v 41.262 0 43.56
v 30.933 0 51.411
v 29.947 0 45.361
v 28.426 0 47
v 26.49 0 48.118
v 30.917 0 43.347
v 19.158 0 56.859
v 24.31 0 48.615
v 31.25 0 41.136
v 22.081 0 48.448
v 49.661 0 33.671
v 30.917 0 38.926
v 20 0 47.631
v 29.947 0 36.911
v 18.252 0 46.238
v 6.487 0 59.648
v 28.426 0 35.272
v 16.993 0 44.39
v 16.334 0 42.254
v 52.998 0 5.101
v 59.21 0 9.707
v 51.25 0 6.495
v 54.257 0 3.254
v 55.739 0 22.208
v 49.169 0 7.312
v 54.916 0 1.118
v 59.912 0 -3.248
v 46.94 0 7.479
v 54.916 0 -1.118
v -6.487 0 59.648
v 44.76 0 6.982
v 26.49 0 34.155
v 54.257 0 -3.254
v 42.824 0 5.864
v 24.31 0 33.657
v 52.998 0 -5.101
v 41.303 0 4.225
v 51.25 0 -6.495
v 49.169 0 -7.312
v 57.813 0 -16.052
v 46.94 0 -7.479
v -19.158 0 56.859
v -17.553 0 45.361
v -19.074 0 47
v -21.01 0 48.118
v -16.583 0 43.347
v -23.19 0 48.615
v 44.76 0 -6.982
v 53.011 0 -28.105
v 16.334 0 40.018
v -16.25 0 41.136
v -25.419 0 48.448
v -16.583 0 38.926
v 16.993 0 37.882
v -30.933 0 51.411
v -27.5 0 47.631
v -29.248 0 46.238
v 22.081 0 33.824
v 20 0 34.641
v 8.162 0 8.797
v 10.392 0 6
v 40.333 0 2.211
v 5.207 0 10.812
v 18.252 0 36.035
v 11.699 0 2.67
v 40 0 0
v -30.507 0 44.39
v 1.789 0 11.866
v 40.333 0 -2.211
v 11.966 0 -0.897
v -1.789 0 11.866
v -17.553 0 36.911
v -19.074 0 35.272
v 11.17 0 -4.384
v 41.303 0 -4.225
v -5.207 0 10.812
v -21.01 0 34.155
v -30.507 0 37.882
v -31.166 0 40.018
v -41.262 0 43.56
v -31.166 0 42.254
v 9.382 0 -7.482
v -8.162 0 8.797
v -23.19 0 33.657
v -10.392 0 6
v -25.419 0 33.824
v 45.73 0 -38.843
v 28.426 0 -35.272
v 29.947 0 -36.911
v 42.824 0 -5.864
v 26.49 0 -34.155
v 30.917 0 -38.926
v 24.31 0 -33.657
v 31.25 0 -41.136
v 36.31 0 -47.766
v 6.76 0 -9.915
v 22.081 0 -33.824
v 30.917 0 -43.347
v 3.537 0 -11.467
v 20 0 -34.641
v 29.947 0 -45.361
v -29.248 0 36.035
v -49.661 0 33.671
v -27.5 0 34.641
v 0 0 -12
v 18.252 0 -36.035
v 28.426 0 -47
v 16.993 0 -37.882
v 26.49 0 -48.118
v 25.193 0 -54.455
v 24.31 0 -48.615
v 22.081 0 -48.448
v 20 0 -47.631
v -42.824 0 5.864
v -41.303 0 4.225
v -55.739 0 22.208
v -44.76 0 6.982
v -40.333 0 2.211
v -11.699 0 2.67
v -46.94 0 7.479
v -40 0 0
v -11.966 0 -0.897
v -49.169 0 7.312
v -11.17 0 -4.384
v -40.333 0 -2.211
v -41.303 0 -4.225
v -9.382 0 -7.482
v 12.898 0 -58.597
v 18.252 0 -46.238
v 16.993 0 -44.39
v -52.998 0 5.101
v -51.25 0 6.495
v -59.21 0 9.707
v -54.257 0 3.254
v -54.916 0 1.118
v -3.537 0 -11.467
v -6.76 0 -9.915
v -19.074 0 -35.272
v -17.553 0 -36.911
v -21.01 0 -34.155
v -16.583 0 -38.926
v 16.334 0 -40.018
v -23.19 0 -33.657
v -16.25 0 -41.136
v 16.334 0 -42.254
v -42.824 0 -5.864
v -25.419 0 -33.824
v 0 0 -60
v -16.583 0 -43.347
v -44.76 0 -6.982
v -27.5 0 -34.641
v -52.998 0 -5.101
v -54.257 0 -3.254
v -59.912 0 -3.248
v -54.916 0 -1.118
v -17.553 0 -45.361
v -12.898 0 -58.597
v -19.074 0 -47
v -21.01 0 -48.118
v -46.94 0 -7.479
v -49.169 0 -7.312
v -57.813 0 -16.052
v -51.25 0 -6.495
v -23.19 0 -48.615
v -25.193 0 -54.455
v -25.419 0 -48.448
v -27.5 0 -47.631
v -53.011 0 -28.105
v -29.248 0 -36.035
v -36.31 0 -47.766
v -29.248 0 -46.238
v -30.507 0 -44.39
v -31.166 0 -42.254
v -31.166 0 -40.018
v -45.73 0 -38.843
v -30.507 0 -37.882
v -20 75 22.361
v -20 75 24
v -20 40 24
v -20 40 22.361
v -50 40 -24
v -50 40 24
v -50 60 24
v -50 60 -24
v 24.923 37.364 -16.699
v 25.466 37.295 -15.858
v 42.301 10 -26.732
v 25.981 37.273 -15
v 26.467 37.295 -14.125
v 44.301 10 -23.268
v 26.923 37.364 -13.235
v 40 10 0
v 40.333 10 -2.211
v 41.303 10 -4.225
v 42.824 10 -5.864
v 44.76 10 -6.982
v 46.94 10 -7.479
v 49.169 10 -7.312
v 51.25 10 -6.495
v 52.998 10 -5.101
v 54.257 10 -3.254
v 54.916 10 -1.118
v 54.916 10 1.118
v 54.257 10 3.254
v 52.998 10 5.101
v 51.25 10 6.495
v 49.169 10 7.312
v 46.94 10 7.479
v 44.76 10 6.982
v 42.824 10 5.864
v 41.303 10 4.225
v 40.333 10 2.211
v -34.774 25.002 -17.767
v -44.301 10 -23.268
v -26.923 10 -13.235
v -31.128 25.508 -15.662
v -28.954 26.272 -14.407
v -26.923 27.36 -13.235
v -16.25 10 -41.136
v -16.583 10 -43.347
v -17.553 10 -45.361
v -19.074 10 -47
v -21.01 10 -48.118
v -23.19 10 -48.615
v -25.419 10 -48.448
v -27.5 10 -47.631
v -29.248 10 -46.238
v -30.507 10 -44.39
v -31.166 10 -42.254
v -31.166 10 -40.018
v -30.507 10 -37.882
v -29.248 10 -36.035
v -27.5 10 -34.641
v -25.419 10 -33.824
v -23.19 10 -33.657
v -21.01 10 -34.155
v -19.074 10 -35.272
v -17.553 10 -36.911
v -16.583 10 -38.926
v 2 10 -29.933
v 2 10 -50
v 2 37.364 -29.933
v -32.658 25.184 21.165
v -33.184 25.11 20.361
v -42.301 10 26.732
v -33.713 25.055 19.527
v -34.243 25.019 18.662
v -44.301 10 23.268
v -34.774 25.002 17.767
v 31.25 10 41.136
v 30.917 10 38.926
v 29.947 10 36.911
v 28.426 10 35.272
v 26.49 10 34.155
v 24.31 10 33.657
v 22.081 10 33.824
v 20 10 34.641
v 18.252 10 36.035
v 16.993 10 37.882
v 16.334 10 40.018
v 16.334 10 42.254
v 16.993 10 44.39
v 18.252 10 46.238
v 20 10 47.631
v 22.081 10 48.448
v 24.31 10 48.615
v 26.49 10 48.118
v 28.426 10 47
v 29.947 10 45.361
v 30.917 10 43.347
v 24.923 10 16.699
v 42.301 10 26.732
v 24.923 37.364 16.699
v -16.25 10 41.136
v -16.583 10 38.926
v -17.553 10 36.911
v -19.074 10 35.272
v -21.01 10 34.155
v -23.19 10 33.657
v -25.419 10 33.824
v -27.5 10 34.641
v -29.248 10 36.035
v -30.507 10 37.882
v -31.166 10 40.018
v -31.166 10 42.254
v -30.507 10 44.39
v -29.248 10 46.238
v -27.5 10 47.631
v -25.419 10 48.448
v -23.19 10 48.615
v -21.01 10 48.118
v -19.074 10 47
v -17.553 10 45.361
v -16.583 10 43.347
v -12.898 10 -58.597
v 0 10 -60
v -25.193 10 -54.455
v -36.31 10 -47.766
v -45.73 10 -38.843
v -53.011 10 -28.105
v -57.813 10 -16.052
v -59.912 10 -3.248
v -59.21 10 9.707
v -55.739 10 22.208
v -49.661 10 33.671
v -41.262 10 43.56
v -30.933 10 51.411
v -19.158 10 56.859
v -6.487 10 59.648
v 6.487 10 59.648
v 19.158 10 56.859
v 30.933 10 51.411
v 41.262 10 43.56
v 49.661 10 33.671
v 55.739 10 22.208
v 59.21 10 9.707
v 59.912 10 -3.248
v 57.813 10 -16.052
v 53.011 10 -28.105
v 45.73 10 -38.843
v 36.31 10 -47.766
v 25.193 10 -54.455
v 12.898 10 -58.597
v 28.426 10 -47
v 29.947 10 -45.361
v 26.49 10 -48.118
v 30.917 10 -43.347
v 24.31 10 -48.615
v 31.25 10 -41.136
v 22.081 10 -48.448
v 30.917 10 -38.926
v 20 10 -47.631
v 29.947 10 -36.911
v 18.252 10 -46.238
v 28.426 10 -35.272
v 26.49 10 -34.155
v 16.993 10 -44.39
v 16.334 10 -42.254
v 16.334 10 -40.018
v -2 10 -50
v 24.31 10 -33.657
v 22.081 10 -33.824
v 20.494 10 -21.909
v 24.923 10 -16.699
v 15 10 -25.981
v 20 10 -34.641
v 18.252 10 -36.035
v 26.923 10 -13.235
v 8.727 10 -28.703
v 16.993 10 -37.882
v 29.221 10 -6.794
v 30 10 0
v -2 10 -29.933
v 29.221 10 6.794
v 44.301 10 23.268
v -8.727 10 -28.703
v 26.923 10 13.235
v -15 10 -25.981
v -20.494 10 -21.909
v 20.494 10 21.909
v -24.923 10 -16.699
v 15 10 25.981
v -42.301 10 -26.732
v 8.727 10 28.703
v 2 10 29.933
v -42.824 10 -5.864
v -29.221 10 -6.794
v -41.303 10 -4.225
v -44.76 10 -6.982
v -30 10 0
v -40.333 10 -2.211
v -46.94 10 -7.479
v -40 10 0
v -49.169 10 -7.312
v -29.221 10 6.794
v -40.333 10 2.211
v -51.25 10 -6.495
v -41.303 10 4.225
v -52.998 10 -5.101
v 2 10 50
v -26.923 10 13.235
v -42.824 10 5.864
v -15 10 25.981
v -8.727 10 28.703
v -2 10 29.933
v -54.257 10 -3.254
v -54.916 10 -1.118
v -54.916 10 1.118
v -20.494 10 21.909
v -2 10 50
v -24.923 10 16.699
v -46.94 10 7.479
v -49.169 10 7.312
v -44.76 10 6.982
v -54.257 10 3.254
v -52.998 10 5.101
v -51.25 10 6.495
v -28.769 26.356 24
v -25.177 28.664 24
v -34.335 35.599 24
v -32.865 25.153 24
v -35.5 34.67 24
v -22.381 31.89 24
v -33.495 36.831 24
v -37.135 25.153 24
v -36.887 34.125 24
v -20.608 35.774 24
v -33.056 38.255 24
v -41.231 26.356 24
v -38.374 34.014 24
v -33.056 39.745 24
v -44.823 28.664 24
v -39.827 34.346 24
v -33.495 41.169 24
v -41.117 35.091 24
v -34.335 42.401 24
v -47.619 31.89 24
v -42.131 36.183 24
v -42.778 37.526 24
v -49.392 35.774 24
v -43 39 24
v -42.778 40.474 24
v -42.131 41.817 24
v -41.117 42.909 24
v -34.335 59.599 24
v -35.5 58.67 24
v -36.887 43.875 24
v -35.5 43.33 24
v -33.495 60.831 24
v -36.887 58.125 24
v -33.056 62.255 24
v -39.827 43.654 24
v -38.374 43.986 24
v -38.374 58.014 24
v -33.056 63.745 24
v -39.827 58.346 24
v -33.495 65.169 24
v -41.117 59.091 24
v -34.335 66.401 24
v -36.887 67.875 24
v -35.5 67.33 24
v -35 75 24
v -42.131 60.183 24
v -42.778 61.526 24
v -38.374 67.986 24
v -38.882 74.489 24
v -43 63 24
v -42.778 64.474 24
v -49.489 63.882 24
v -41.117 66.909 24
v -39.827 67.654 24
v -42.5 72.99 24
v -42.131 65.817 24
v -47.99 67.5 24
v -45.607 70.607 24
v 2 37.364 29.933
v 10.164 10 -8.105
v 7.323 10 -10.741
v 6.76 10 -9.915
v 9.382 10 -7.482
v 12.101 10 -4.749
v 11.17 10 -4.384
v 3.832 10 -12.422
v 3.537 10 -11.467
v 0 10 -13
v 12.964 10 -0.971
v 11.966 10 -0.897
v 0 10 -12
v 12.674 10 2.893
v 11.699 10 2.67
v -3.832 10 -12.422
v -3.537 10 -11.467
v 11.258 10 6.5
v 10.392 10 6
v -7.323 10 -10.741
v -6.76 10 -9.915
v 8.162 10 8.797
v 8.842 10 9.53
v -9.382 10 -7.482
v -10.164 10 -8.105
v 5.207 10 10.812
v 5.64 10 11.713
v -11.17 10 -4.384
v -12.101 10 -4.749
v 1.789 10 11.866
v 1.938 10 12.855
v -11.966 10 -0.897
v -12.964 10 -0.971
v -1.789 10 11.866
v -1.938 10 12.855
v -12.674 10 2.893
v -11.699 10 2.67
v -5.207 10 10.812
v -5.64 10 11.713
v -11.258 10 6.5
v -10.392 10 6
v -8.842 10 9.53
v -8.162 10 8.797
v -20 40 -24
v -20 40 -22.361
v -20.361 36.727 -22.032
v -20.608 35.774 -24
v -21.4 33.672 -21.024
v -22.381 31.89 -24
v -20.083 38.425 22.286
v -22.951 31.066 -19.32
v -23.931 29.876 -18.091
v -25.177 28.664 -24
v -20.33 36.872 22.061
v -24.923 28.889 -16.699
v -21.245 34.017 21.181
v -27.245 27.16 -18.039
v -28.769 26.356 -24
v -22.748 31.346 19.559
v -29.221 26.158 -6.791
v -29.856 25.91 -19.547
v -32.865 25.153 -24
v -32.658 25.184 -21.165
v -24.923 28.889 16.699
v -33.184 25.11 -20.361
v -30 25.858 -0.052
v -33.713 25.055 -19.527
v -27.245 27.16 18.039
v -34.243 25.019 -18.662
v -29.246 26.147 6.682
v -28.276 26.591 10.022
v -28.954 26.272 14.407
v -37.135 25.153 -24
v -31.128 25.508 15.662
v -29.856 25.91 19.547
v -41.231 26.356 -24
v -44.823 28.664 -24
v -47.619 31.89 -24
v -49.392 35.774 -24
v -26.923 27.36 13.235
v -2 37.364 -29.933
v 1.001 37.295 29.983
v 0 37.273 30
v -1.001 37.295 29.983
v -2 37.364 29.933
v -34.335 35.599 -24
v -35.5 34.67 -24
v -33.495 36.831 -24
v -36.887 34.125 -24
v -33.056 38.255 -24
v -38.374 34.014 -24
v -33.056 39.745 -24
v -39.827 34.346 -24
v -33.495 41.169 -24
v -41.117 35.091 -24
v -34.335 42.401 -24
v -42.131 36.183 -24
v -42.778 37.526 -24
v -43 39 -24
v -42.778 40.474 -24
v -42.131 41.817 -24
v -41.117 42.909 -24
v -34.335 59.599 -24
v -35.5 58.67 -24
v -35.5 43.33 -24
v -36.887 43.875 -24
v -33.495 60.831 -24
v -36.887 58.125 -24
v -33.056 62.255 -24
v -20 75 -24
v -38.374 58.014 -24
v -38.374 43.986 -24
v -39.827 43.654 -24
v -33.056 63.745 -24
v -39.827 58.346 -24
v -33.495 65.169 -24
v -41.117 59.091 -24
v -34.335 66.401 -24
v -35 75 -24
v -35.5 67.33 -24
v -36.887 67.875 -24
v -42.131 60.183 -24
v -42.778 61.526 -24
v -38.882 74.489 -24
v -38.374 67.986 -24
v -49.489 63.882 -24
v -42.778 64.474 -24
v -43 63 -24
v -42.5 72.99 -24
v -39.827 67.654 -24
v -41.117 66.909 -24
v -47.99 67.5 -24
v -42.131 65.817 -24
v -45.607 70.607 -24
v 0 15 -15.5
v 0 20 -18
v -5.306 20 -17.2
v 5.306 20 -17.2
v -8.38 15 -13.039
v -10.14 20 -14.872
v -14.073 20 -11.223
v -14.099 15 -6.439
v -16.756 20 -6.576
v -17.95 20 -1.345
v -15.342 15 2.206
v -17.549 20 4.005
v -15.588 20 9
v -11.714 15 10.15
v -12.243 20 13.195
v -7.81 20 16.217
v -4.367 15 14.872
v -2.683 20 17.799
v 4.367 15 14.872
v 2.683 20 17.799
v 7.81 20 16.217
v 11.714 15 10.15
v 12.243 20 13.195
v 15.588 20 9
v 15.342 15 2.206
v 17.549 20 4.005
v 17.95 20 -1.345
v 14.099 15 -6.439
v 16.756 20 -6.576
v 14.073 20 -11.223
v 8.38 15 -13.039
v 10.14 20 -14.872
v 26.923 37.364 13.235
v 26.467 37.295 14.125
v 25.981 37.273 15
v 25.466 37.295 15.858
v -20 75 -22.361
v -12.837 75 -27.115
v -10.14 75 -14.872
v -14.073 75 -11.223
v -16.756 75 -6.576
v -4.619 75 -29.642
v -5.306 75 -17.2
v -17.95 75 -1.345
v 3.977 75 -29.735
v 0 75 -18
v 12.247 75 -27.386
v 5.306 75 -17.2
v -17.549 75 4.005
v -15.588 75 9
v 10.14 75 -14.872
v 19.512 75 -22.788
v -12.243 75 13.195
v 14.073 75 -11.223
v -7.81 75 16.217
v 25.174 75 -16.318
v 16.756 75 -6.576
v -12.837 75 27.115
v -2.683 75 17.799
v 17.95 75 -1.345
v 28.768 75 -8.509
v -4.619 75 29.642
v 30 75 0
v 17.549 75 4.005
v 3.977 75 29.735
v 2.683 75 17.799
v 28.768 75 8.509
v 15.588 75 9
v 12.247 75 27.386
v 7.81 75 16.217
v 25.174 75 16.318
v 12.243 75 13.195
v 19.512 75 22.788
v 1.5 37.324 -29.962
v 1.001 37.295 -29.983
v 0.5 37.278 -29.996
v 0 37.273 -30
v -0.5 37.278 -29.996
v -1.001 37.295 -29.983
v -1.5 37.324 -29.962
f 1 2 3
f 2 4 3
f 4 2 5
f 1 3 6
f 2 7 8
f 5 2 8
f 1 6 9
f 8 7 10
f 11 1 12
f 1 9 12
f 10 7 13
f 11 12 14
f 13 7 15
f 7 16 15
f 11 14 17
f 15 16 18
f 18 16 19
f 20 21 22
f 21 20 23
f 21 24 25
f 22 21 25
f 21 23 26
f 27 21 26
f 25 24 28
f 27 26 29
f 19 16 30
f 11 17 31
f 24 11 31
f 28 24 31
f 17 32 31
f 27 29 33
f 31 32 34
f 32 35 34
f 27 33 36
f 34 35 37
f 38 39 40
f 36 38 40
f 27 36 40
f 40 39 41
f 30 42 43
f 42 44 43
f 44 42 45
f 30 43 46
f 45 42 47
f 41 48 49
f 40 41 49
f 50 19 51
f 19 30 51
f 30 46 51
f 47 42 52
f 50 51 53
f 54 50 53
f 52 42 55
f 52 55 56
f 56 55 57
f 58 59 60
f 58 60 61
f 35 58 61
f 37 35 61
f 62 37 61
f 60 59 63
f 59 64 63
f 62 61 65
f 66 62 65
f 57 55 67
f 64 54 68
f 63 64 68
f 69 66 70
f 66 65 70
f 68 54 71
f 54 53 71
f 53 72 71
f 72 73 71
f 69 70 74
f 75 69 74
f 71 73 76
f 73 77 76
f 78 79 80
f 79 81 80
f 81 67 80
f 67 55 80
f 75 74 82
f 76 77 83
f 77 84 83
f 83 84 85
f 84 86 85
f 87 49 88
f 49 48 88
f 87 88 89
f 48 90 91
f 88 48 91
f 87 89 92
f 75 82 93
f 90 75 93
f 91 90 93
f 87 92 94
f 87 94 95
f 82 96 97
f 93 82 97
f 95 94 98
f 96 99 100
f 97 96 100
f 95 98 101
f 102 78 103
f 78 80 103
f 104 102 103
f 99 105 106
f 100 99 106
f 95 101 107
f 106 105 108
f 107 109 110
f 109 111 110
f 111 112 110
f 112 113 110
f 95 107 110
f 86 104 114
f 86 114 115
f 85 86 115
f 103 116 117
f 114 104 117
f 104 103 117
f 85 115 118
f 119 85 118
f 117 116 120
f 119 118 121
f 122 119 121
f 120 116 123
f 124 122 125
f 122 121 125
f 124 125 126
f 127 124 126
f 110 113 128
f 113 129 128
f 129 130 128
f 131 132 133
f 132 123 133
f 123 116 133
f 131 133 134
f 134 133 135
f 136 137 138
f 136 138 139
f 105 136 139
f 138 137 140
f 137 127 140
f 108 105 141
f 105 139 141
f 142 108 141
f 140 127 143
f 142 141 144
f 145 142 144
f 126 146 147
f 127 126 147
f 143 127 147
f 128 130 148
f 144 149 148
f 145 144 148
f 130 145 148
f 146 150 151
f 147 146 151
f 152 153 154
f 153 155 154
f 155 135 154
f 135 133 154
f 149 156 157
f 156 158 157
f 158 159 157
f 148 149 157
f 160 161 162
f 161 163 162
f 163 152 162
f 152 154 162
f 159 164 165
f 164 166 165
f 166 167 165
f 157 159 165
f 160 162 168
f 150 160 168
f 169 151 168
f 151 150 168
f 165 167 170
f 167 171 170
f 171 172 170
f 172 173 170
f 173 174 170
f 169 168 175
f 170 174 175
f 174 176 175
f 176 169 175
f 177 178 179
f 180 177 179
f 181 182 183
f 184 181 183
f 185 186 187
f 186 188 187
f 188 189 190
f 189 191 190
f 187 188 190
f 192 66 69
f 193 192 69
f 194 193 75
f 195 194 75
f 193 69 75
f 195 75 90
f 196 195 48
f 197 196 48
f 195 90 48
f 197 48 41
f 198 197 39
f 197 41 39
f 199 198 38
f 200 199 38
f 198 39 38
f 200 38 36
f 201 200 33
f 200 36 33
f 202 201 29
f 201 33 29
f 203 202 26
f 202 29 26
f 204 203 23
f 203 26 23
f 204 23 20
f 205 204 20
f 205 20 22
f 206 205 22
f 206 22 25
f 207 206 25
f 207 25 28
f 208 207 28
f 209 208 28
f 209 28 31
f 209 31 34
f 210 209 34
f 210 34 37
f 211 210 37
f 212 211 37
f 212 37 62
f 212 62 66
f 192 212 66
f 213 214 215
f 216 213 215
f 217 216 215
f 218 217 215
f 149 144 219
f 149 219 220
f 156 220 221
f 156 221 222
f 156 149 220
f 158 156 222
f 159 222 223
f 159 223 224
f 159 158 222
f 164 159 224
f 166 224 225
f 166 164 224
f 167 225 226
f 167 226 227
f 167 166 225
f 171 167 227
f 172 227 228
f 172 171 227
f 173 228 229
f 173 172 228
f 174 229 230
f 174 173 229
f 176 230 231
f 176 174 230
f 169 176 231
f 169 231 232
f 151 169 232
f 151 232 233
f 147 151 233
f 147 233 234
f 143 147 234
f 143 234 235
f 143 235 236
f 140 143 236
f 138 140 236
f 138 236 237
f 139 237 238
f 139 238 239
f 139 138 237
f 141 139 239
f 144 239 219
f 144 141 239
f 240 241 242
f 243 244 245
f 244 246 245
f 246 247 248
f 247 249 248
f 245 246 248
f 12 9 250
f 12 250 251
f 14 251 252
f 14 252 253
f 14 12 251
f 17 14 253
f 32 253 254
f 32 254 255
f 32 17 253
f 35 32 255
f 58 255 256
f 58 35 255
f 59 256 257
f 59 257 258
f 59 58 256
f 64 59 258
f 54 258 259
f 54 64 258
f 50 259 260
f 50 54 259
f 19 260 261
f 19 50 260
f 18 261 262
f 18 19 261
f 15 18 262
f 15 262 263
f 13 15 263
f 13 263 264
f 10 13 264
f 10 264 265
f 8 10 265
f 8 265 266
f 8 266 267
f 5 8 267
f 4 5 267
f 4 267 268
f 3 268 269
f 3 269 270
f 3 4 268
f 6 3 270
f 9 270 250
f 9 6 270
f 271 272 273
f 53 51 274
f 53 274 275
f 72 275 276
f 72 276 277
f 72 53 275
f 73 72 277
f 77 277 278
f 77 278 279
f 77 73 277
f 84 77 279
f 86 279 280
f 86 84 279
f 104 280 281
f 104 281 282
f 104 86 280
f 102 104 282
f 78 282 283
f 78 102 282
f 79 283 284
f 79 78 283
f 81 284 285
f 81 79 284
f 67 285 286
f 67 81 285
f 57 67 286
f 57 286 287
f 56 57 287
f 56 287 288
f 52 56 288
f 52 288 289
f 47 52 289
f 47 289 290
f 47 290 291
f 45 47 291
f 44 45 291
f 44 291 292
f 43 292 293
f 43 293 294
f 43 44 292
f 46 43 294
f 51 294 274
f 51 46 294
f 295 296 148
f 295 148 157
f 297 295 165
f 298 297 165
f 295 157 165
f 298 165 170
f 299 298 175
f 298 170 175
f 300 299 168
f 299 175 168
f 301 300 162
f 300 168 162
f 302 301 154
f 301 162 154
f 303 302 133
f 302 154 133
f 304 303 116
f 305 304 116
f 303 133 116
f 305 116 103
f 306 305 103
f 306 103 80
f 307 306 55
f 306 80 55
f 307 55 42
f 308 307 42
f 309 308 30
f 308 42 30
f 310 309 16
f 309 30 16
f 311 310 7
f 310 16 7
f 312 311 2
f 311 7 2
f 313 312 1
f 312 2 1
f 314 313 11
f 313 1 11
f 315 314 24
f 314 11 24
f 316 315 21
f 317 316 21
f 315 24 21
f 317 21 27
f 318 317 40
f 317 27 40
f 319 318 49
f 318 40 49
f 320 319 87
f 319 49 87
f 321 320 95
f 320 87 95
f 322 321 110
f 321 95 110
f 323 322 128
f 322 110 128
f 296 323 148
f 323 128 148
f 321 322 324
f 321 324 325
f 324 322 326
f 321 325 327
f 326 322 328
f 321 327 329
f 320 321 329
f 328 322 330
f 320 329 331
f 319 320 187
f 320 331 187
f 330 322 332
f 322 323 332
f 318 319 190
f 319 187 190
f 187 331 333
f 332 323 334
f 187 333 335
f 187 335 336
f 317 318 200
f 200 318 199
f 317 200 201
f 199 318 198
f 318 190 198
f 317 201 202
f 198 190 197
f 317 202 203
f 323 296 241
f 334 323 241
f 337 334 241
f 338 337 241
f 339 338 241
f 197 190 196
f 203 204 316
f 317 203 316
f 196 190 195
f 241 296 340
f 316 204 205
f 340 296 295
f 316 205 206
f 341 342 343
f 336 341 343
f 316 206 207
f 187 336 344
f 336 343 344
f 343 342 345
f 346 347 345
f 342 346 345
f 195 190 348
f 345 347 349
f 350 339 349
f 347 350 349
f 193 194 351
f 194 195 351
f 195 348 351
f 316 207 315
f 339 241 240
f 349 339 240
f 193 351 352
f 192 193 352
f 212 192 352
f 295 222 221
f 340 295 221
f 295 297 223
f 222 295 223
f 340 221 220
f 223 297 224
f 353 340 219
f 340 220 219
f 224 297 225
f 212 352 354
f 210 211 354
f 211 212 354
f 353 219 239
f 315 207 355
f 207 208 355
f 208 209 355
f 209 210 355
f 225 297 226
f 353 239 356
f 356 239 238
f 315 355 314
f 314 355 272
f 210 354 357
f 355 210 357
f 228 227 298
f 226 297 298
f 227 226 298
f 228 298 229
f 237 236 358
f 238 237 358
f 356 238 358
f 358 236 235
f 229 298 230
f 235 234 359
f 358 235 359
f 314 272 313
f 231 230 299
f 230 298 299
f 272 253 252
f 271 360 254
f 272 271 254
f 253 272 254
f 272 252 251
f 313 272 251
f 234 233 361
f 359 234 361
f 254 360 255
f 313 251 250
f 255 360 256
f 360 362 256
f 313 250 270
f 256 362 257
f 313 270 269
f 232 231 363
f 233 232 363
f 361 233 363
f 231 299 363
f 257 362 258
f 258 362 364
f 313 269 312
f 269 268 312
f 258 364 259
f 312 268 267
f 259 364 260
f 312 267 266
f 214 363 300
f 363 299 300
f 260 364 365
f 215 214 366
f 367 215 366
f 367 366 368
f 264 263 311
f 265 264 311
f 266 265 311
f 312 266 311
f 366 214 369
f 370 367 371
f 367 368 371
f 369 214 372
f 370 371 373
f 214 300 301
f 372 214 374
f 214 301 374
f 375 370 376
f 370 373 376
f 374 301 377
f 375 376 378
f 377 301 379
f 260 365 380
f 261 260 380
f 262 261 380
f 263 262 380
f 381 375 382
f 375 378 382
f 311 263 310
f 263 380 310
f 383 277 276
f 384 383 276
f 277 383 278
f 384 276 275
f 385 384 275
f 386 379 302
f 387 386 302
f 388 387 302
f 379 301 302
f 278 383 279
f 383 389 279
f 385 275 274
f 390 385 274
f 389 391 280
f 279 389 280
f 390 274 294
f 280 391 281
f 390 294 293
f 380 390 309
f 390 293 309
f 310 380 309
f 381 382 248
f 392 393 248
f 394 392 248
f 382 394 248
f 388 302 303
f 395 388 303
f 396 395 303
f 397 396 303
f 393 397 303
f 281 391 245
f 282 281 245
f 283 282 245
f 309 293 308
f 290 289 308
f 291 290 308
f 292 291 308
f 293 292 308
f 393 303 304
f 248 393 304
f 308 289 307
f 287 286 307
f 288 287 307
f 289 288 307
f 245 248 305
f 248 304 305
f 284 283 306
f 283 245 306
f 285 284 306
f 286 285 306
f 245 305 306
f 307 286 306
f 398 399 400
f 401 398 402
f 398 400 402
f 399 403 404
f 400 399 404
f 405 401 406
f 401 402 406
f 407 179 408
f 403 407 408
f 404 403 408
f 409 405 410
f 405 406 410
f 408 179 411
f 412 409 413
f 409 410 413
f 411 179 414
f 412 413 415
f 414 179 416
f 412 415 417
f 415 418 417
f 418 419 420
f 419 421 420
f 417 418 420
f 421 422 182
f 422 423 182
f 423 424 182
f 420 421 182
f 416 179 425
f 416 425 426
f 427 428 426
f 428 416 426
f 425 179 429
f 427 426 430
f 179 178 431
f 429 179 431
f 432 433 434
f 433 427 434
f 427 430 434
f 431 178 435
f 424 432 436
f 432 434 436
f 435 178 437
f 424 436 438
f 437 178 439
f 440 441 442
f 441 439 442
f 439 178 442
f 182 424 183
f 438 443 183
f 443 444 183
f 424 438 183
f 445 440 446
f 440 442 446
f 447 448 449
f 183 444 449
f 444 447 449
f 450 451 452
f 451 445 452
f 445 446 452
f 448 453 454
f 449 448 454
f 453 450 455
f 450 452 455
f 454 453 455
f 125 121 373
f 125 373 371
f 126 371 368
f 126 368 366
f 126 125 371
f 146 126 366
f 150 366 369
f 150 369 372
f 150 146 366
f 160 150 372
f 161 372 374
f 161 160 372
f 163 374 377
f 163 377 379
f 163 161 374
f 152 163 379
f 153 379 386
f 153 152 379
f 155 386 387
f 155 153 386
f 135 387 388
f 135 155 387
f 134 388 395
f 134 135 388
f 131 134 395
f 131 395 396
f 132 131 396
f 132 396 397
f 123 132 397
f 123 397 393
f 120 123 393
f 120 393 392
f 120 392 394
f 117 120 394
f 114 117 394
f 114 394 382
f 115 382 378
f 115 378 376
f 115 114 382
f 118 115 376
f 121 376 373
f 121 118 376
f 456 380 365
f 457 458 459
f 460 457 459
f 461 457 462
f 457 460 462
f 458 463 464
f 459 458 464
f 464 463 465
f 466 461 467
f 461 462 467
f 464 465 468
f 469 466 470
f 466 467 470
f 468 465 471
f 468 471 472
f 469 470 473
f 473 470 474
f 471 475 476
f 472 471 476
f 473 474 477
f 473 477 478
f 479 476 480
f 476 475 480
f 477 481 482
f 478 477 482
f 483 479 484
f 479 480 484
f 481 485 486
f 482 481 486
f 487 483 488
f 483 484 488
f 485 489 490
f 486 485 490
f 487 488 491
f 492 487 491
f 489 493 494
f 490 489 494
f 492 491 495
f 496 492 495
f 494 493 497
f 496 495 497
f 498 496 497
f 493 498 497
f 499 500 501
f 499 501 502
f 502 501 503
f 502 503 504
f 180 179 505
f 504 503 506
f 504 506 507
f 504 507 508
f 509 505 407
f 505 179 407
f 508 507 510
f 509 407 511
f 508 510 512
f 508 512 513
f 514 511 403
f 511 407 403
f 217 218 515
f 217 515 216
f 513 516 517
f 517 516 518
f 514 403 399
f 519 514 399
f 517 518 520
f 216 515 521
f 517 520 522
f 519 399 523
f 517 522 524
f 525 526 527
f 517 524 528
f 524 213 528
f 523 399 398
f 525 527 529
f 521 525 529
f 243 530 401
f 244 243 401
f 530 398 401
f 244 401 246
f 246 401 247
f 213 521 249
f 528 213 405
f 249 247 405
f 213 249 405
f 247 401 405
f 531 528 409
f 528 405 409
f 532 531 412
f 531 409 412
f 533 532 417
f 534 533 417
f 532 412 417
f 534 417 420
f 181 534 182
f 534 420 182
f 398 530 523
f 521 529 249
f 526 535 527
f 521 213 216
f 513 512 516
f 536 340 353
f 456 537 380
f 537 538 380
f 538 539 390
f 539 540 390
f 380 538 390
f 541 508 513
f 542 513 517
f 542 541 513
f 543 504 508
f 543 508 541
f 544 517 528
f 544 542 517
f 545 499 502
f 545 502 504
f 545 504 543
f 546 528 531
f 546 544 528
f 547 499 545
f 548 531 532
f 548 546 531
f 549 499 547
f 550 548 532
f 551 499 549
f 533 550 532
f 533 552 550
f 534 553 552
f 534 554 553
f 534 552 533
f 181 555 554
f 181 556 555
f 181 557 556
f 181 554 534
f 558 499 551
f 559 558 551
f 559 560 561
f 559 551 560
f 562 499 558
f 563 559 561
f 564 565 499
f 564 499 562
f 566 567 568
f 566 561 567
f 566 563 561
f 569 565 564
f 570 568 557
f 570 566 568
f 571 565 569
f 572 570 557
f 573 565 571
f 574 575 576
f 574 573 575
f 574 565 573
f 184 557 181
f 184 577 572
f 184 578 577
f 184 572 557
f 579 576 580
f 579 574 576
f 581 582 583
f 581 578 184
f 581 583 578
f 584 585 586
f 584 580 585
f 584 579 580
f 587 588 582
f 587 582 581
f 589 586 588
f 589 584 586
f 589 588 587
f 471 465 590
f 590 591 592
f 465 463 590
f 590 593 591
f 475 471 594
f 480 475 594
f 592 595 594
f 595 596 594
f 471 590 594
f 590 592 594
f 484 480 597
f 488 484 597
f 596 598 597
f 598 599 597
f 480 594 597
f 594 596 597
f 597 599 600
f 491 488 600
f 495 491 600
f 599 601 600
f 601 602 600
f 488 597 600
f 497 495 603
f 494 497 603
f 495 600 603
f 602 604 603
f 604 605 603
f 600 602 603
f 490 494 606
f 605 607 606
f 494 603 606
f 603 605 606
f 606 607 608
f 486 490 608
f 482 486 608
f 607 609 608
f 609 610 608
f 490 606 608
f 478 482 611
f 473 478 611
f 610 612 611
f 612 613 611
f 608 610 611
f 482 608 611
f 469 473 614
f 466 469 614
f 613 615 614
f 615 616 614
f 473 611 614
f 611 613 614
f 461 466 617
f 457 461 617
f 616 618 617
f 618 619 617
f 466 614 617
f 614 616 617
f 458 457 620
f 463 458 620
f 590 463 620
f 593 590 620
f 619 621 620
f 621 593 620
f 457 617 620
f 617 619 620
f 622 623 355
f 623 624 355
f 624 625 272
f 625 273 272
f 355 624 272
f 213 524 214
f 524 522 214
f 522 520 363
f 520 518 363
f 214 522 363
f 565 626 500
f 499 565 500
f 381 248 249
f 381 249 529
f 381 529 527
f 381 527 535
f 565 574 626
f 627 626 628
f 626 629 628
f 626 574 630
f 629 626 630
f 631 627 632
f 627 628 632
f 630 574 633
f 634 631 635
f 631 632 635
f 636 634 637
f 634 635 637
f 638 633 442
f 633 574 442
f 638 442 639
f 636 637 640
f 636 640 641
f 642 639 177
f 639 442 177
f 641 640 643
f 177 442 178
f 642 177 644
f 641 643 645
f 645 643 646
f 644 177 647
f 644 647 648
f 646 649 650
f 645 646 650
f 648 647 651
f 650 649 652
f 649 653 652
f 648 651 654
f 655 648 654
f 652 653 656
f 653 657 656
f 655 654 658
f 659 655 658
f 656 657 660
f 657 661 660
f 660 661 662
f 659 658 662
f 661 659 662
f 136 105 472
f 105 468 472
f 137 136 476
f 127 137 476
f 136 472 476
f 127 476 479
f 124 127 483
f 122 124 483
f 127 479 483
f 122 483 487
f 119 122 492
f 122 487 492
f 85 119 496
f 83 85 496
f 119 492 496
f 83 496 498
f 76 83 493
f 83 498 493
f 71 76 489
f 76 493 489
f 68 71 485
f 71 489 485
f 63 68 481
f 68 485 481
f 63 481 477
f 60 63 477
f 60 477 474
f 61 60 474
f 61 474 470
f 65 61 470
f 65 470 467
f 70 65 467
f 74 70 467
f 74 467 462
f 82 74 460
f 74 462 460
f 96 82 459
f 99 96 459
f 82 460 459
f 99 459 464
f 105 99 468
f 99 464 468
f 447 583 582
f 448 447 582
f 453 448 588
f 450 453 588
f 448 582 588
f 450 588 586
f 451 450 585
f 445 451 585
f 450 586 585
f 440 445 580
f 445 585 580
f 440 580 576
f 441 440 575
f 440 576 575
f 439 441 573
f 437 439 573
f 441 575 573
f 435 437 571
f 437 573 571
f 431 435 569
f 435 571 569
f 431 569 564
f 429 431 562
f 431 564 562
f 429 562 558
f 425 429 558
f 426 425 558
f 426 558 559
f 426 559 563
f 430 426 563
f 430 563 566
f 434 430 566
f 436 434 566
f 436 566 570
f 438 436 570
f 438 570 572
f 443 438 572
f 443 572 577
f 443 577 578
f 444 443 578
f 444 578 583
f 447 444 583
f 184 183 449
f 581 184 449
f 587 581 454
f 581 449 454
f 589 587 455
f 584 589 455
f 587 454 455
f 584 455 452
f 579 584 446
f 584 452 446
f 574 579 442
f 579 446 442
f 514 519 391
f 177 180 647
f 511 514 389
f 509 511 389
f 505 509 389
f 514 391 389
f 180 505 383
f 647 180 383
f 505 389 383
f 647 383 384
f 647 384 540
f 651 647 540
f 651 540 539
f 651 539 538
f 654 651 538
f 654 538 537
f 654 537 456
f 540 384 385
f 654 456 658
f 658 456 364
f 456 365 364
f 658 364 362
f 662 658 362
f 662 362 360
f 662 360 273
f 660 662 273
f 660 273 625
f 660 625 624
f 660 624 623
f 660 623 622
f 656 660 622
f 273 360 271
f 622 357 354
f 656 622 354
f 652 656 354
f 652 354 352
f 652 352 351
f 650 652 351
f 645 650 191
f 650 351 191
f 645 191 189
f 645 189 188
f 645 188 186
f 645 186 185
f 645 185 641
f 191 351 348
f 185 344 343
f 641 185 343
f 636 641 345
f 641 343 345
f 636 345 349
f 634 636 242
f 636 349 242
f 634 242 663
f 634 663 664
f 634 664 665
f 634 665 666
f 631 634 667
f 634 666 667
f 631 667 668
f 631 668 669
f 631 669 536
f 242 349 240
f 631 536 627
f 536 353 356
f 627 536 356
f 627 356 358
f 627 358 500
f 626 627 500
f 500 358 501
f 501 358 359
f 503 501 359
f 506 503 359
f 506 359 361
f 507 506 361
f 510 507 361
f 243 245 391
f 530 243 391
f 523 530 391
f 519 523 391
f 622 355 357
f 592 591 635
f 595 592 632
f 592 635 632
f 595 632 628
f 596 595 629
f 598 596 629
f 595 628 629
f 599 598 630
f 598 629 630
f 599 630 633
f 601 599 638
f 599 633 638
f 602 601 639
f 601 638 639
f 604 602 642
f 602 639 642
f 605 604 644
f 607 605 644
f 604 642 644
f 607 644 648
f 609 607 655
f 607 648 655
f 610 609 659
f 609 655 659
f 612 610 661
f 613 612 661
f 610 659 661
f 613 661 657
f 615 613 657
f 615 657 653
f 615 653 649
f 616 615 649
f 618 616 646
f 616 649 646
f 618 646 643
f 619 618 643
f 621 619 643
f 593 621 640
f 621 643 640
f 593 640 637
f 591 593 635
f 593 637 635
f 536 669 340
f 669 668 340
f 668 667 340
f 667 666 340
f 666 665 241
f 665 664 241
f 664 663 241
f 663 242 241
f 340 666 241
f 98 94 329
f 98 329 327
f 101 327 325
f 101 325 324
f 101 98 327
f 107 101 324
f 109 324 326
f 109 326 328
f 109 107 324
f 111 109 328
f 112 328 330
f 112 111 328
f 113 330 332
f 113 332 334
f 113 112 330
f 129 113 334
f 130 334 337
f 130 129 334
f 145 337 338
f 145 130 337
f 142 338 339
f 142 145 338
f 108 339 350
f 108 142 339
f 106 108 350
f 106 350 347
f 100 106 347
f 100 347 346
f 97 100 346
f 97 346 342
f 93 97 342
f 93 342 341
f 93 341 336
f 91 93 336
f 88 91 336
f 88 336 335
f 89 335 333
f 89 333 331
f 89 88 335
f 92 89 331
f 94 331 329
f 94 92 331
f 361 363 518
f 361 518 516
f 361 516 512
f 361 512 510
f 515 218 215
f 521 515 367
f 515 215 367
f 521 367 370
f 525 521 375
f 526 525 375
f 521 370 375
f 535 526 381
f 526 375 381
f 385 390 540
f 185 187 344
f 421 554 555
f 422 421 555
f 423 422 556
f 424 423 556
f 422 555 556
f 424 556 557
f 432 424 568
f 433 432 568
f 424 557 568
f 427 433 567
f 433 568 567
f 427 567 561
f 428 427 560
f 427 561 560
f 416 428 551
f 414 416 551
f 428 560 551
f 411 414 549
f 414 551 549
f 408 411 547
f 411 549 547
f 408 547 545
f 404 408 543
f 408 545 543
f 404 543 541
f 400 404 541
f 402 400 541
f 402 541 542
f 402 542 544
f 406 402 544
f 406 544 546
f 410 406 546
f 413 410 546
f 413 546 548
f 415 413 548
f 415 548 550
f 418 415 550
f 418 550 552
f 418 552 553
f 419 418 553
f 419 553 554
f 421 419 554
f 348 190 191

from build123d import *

# Parameters (mm, degrees)
BOSS_EXTRUDE1_DEPTH   = 48
HOLE1_D               = 10
BOSS_EXTRUDE2_DEPTH   = 2
CIRPATTERN1_COUNT     = 6
HOLE2_D               = 15
CIRPATTERN2_OUTLINE_R = 7.5
CIRPATTERN2_DEPTH     = 10


# Read off the part's stored shape, not the designer's step: CirPattern2
with BuildPart() as part:
    # Sketch1 → Revolve1 (revolve)
    with BuildSketch(Plane.XY, mode=Mode.PRIVATE) as revolve1_sk:
        Polygon((12, 0), (12, 10), (13, 10), (18, 20), (18, 75), (30, 75), (30, 10), (60, 10), (60, 0), align=None)
    revolve(revolve1_sk.sketch.rotate(Axis((0, 0, 0), (0, 1, 0)), 90), axis=Axis((0, 0, 0), (0, 1, 0)))

    # Sketch2 → Boss-Extrude1 (add)
    with BuildSketch(Plane.XY.offset(24)):
        with BuildLine():
            Line((-20, 60), (-20, 40))
            ThreePointArc((-20, 40), (-35, 25), (-50, 40))
            Line((-50, 40), (-50, 60))
            ThreePointArc((-50, 60), (-45.606601718, 70.606601718), (-35, 75))
            Line((-35, 75), (-20, 75))
            Line((-20, 75), (-20, 60))
        make_face()
    extrude(amount=-BOSS_EXTRUDE1_DEPTH)

    # Hole1 (through all)
    with Locations(Plane.XY.offset(24)):
        with Locations((-38, 63), (-38, 39)):
            Hole(HOLE1_D / 2)

    # Sketch5 → Boss-Extrude2 (add, symmetric)
    with BuildSketch(Plane(origin=(0, 0, 0), x_dir=(0, 0, -1), z_dir=(1, 0, 0))):
        Polygon((28, 40), (50, 10), (28, 10), align=None)
    boss_extrude2 = extrude(amount=BOSS_EXTRUDE2_DEPTH, both=True)

    # CirPattern1: Boss-Extrude2 ×6 about axis
    cirpattern1_axis = Axis((0, 0, 0), (0, 1, 0))
    for i in range(1, CIRPATTERN1_COUNT):
        add(boss_extrude2.rotate(cirpattern1_axis, i * 360 / CIRPATTERN1_COUNT))

    # Hole2 (through all)
    with Locations(Plane(origin=(0, 10, 0), x_dir=(1, 0, 0), z_dir=(0, 1, 0))):
        with Locations((47.5, 0)):
            Hole(HOLE2_D / 2)

    # CirPattern2 outline → CirPattern2 (cut)
    with BuildSketch(Plane(origin=(0, 0, 0), x_dir=(1, 0, 0), z_dir=(0, 1, 0))):
        with Locations((23.75, 41.13620668)):
            Circle(CIRPATTERN2_OUTLINE_R)
        with Locations((-23.75, 41.13620668)):
            Circle(CIRPATTERN2_OUTLINE_R)
        with Locations((-47.5, 0)):
            Circle(CIRPATTERN2_OUTLINE_R)
        with Locations((-23.75, -41.13620668)):
            Circle(CIRPATTERN2_OUTLINE_R)
        with Locations((23.75, -41.13620668)):
            Circle(CIRPATTERN2_OUTLINE_R)
    extrude(amount=CIRPATTERN2_DEPTH, mode=Mode.SUBTRACT)


solid = part.part
